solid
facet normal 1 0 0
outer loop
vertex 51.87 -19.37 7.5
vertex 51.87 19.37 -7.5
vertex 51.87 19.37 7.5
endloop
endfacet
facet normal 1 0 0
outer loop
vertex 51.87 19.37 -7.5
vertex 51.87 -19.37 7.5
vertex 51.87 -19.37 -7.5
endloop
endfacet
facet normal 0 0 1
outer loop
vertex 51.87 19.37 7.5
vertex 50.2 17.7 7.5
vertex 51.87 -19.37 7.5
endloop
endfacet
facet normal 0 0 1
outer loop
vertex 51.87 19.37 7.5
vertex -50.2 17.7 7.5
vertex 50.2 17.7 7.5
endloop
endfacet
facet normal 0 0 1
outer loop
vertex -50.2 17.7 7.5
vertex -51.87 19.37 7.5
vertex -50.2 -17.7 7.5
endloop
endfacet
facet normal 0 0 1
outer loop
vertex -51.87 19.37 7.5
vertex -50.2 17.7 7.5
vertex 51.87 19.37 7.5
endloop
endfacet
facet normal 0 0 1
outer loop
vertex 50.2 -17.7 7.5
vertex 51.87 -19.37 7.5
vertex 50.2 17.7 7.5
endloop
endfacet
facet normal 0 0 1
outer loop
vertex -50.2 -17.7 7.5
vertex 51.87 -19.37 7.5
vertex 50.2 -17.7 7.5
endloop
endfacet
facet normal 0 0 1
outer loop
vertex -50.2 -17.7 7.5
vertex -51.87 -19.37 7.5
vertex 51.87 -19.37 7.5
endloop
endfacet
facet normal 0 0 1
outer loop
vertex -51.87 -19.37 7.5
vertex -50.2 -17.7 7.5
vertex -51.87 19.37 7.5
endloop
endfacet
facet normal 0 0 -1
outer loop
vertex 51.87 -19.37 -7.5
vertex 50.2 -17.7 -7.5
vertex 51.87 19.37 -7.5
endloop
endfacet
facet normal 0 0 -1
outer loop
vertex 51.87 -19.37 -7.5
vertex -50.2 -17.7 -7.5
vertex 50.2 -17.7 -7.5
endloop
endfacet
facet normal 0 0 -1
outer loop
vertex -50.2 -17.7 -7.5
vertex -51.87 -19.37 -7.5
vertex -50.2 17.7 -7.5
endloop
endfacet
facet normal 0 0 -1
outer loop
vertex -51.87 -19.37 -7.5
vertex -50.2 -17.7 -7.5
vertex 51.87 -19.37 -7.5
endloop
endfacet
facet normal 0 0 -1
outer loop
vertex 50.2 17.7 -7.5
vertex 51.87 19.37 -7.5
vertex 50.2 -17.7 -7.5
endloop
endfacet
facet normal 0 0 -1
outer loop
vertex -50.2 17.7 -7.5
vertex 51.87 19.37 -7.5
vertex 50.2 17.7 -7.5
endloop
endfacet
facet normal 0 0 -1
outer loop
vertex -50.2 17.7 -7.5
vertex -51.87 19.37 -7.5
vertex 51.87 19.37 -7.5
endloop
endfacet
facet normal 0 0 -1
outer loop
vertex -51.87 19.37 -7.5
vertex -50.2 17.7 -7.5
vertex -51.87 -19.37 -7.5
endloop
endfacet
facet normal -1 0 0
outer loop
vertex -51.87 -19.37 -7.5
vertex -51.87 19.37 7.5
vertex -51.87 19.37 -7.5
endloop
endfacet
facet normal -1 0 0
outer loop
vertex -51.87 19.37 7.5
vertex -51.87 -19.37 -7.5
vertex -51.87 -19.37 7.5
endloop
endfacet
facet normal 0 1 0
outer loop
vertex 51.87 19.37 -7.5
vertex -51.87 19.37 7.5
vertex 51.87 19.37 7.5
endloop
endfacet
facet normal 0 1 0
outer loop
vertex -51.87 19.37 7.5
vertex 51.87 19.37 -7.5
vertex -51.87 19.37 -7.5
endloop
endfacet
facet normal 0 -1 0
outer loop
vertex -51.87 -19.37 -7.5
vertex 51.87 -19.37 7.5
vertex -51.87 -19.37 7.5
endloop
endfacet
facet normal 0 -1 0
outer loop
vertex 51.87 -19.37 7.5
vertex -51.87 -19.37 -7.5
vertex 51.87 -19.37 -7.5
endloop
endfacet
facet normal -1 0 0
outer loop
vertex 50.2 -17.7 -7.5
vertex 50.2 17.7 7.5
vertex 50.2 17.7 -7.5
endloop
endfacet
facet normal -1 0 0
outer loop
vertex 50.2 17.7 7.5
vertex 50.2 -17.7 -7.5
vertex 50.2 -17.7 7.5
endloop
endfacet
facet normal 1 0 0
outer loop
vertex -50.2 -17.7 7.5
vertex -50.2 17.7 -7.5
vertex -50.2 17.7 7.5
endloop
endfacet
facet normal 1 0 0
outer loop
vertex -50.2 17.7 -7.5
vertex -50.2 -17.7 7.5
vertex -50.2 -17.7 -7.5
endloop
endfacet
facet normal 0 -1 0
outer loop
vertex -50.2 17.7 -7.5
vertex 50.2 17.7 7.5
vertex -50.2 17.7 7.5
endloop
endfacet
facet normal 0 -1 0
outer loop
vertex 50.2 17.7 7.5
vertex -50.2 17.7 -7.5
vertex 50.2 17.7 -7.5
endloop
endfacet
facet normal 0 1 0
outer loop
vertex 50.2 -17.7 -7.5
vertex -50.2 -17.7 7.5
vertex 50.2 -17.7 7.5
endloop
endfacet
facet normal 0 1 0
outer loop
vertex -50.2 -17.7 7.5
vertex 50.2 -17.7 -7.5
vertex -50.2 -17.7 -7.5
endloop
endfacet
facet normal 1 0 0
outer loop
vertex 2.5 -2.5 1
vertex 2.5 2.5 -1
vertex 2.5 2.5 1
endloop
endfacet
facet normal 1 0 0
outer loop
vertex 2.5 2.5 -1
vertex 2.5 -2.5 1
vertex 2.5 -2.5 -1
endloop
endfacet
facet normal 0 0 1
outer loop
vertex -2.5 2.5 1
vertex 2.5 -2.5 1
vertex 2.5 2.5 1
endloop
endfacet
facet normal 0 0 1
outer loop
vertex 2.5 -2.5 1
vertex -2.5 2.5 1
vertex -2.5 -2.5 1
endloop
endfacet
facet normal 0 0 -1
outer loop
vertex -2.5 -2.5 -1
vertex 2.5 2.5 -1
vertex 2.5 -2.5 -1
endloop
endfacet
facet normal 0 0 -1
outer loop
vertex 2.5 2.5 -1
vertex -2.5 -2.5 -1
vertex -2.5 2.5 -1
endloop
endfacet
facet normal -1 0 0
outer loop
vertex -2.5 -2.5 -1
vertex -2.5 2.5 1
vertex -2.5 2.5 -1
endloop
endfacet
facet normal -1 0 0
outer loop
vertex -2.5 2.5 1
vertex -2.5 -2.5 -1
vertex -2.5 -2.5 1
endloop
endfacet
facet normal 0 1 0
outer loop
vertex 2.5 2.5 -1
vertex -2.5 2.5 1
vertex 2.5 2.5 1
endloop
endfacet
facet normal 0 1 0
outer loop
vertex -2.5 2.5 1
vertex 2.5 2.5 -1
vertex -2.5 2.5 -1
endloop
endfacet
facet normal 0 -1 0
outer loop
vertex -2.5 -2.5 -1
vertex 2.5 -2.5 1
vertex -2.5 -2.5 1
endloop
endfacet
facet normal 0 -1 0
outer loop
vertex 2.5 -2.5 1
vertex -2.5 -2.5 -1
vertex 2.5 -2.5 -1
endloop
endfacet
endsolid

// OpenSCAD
// file: BOSL2/std.scad
// Minimal BOSL2 compatibility shim for bundled gallery models.
// It implements only the helpers used by the imported OpenSCAD projects.

CENTER = [0, 0, 0];
BOTTOM = [0, 0, -1];
TOP = [0, 0, 1];
LEFT = [-1, 0, 0];
RIGHT = [1, 0, 0];
FRONT = [0, -1, 0];
BACK = [0, 1, 0];

module up(z=0) {
    translate([0, 0, z]) children();
}

module down(z=0) {
    translate([0, 0, -z]) children();
}

module attach(anchor=CENTER) {
    children();
}

module cuboid(size=[1, 1, 1], anchor=CENTER) {
    center = anchor == CENTER;
    translate(center ? [0, 0, 0] : [0, 0, size[2] / 2])
        cube(size, center=true);
    children();
}

module xcyl(h=1, r=1, anchor=CENTER) {
    center = anchor == CENTER;
    translate(center ? [0, 0, 0] : [h / 2, 0, 0])
        rotate([0, 90, 0])
            cylinder(h=h, r=r, center=true);
}
// main file
// -----------------------------------------------------------------------------
// 3D-Model (OpenSCAD) Gehäuse Steuermodul.
//
// Author: Bernhard Bablok
// License: GPL3
//
// Website: https://github.com/bablokb/pcb-adventskranz
//
// -----------------------------------------------------------------------------

include <BOSL2/std.scad>

$fa = 1;
$fs = 0.4;
//$fn = 64;
$fn = 24;

fuzz = 0.001;

// dimensions
w4 = 1.67;           // wall 4 layers
d  = 0.2;            // delta

x_pcb = 100;         // pcb dimensions
y_pcb = 35;
z_pcb = 15;

x_85     = 18.3;     // attiny85 dimensions
y_85     = 24.1;
x_off_85 = 62.8;     // offset of attiny85
y_off_85 = 10.3;

x_sd     = 8;        // cutout for SD-connector
x_off_sd = 5.3;      // offset relative to x_85
z_off_sd = 4.0;      // offset relative to bottom of pcb

x_pins     = 8.2;    // cutout for pins
x_off_pins = 73.5;
z_off_pins = 3.5;

r = 3;               // edges 3mm rounding
b = 1.2;             // bottom-plate
s_x = 5;             // support in the corners
s_y = s_x;
s_z = 2;

// --- inner void   --------------------------------------------------------------

module inner() {
  cuboid([x_pcb+2*d,y_pcb+2*d,z_pcb+b], p1=[-d,-d,b]);                      // pcb
  cuboid([x_85+2*d,y_85+2*d,z_pcb+b], p1=[-d+x_off_85-d,-d-y_off_85-d,b]);  // attiny85
}

// --- outer shell   ------------------------------------------------------------

module outer() {
  cuboid(
      [x_pcb+2*d+2*w4,y_pcb+2*d+2*w4,z_pcb], p1=[-d-w4,-d-w4,0],
      rounding=r,
      edges=[LEFT+FRONT,RIGHT+FRONT,LEFT+BACK,RIGHT+BACK]
  );
  cuboid(
      [x_85+2*d+2*w4,y_85+2*d+2*w4,z_pcb], p1=[-d+x_off_85-d-w4,-d-y_off_85-d-w4,0],
      rounding=r,
      edges=[LEFT+FRONT,RIGHT+FRONT,LEFT+BACK,RIGHT+BACK]
  );
}

difference() {
  outer();
  inner();
  cuboid([x_sd+2*d,10,z_pcb+b], p1=[-d+x_off_85+x_off_sd-d,-d-y_off_85-5,b+s_z+z_off_sd]);
  cuboid([x_pins+2*d,10,z_pcb+b], p1=[-d+x_off_pins-d,y_pcb-5,b+s_z+z_off_pins]);
}
cuboid([s_x,s_y,s_z], p1=[-d,-d,b]);
cuboid([s_x,s_y,s_z], p1=[-d,y_pcb+d-s_y,b]);
cuboid([s_x,s_y,s_z], p1=[x_pcb-s_x+d,-d,b]);
cuboid([s_x,s_y,s_z], p1=[x_pcb-s_x+d,y_pcb+d-s_y,b]);
